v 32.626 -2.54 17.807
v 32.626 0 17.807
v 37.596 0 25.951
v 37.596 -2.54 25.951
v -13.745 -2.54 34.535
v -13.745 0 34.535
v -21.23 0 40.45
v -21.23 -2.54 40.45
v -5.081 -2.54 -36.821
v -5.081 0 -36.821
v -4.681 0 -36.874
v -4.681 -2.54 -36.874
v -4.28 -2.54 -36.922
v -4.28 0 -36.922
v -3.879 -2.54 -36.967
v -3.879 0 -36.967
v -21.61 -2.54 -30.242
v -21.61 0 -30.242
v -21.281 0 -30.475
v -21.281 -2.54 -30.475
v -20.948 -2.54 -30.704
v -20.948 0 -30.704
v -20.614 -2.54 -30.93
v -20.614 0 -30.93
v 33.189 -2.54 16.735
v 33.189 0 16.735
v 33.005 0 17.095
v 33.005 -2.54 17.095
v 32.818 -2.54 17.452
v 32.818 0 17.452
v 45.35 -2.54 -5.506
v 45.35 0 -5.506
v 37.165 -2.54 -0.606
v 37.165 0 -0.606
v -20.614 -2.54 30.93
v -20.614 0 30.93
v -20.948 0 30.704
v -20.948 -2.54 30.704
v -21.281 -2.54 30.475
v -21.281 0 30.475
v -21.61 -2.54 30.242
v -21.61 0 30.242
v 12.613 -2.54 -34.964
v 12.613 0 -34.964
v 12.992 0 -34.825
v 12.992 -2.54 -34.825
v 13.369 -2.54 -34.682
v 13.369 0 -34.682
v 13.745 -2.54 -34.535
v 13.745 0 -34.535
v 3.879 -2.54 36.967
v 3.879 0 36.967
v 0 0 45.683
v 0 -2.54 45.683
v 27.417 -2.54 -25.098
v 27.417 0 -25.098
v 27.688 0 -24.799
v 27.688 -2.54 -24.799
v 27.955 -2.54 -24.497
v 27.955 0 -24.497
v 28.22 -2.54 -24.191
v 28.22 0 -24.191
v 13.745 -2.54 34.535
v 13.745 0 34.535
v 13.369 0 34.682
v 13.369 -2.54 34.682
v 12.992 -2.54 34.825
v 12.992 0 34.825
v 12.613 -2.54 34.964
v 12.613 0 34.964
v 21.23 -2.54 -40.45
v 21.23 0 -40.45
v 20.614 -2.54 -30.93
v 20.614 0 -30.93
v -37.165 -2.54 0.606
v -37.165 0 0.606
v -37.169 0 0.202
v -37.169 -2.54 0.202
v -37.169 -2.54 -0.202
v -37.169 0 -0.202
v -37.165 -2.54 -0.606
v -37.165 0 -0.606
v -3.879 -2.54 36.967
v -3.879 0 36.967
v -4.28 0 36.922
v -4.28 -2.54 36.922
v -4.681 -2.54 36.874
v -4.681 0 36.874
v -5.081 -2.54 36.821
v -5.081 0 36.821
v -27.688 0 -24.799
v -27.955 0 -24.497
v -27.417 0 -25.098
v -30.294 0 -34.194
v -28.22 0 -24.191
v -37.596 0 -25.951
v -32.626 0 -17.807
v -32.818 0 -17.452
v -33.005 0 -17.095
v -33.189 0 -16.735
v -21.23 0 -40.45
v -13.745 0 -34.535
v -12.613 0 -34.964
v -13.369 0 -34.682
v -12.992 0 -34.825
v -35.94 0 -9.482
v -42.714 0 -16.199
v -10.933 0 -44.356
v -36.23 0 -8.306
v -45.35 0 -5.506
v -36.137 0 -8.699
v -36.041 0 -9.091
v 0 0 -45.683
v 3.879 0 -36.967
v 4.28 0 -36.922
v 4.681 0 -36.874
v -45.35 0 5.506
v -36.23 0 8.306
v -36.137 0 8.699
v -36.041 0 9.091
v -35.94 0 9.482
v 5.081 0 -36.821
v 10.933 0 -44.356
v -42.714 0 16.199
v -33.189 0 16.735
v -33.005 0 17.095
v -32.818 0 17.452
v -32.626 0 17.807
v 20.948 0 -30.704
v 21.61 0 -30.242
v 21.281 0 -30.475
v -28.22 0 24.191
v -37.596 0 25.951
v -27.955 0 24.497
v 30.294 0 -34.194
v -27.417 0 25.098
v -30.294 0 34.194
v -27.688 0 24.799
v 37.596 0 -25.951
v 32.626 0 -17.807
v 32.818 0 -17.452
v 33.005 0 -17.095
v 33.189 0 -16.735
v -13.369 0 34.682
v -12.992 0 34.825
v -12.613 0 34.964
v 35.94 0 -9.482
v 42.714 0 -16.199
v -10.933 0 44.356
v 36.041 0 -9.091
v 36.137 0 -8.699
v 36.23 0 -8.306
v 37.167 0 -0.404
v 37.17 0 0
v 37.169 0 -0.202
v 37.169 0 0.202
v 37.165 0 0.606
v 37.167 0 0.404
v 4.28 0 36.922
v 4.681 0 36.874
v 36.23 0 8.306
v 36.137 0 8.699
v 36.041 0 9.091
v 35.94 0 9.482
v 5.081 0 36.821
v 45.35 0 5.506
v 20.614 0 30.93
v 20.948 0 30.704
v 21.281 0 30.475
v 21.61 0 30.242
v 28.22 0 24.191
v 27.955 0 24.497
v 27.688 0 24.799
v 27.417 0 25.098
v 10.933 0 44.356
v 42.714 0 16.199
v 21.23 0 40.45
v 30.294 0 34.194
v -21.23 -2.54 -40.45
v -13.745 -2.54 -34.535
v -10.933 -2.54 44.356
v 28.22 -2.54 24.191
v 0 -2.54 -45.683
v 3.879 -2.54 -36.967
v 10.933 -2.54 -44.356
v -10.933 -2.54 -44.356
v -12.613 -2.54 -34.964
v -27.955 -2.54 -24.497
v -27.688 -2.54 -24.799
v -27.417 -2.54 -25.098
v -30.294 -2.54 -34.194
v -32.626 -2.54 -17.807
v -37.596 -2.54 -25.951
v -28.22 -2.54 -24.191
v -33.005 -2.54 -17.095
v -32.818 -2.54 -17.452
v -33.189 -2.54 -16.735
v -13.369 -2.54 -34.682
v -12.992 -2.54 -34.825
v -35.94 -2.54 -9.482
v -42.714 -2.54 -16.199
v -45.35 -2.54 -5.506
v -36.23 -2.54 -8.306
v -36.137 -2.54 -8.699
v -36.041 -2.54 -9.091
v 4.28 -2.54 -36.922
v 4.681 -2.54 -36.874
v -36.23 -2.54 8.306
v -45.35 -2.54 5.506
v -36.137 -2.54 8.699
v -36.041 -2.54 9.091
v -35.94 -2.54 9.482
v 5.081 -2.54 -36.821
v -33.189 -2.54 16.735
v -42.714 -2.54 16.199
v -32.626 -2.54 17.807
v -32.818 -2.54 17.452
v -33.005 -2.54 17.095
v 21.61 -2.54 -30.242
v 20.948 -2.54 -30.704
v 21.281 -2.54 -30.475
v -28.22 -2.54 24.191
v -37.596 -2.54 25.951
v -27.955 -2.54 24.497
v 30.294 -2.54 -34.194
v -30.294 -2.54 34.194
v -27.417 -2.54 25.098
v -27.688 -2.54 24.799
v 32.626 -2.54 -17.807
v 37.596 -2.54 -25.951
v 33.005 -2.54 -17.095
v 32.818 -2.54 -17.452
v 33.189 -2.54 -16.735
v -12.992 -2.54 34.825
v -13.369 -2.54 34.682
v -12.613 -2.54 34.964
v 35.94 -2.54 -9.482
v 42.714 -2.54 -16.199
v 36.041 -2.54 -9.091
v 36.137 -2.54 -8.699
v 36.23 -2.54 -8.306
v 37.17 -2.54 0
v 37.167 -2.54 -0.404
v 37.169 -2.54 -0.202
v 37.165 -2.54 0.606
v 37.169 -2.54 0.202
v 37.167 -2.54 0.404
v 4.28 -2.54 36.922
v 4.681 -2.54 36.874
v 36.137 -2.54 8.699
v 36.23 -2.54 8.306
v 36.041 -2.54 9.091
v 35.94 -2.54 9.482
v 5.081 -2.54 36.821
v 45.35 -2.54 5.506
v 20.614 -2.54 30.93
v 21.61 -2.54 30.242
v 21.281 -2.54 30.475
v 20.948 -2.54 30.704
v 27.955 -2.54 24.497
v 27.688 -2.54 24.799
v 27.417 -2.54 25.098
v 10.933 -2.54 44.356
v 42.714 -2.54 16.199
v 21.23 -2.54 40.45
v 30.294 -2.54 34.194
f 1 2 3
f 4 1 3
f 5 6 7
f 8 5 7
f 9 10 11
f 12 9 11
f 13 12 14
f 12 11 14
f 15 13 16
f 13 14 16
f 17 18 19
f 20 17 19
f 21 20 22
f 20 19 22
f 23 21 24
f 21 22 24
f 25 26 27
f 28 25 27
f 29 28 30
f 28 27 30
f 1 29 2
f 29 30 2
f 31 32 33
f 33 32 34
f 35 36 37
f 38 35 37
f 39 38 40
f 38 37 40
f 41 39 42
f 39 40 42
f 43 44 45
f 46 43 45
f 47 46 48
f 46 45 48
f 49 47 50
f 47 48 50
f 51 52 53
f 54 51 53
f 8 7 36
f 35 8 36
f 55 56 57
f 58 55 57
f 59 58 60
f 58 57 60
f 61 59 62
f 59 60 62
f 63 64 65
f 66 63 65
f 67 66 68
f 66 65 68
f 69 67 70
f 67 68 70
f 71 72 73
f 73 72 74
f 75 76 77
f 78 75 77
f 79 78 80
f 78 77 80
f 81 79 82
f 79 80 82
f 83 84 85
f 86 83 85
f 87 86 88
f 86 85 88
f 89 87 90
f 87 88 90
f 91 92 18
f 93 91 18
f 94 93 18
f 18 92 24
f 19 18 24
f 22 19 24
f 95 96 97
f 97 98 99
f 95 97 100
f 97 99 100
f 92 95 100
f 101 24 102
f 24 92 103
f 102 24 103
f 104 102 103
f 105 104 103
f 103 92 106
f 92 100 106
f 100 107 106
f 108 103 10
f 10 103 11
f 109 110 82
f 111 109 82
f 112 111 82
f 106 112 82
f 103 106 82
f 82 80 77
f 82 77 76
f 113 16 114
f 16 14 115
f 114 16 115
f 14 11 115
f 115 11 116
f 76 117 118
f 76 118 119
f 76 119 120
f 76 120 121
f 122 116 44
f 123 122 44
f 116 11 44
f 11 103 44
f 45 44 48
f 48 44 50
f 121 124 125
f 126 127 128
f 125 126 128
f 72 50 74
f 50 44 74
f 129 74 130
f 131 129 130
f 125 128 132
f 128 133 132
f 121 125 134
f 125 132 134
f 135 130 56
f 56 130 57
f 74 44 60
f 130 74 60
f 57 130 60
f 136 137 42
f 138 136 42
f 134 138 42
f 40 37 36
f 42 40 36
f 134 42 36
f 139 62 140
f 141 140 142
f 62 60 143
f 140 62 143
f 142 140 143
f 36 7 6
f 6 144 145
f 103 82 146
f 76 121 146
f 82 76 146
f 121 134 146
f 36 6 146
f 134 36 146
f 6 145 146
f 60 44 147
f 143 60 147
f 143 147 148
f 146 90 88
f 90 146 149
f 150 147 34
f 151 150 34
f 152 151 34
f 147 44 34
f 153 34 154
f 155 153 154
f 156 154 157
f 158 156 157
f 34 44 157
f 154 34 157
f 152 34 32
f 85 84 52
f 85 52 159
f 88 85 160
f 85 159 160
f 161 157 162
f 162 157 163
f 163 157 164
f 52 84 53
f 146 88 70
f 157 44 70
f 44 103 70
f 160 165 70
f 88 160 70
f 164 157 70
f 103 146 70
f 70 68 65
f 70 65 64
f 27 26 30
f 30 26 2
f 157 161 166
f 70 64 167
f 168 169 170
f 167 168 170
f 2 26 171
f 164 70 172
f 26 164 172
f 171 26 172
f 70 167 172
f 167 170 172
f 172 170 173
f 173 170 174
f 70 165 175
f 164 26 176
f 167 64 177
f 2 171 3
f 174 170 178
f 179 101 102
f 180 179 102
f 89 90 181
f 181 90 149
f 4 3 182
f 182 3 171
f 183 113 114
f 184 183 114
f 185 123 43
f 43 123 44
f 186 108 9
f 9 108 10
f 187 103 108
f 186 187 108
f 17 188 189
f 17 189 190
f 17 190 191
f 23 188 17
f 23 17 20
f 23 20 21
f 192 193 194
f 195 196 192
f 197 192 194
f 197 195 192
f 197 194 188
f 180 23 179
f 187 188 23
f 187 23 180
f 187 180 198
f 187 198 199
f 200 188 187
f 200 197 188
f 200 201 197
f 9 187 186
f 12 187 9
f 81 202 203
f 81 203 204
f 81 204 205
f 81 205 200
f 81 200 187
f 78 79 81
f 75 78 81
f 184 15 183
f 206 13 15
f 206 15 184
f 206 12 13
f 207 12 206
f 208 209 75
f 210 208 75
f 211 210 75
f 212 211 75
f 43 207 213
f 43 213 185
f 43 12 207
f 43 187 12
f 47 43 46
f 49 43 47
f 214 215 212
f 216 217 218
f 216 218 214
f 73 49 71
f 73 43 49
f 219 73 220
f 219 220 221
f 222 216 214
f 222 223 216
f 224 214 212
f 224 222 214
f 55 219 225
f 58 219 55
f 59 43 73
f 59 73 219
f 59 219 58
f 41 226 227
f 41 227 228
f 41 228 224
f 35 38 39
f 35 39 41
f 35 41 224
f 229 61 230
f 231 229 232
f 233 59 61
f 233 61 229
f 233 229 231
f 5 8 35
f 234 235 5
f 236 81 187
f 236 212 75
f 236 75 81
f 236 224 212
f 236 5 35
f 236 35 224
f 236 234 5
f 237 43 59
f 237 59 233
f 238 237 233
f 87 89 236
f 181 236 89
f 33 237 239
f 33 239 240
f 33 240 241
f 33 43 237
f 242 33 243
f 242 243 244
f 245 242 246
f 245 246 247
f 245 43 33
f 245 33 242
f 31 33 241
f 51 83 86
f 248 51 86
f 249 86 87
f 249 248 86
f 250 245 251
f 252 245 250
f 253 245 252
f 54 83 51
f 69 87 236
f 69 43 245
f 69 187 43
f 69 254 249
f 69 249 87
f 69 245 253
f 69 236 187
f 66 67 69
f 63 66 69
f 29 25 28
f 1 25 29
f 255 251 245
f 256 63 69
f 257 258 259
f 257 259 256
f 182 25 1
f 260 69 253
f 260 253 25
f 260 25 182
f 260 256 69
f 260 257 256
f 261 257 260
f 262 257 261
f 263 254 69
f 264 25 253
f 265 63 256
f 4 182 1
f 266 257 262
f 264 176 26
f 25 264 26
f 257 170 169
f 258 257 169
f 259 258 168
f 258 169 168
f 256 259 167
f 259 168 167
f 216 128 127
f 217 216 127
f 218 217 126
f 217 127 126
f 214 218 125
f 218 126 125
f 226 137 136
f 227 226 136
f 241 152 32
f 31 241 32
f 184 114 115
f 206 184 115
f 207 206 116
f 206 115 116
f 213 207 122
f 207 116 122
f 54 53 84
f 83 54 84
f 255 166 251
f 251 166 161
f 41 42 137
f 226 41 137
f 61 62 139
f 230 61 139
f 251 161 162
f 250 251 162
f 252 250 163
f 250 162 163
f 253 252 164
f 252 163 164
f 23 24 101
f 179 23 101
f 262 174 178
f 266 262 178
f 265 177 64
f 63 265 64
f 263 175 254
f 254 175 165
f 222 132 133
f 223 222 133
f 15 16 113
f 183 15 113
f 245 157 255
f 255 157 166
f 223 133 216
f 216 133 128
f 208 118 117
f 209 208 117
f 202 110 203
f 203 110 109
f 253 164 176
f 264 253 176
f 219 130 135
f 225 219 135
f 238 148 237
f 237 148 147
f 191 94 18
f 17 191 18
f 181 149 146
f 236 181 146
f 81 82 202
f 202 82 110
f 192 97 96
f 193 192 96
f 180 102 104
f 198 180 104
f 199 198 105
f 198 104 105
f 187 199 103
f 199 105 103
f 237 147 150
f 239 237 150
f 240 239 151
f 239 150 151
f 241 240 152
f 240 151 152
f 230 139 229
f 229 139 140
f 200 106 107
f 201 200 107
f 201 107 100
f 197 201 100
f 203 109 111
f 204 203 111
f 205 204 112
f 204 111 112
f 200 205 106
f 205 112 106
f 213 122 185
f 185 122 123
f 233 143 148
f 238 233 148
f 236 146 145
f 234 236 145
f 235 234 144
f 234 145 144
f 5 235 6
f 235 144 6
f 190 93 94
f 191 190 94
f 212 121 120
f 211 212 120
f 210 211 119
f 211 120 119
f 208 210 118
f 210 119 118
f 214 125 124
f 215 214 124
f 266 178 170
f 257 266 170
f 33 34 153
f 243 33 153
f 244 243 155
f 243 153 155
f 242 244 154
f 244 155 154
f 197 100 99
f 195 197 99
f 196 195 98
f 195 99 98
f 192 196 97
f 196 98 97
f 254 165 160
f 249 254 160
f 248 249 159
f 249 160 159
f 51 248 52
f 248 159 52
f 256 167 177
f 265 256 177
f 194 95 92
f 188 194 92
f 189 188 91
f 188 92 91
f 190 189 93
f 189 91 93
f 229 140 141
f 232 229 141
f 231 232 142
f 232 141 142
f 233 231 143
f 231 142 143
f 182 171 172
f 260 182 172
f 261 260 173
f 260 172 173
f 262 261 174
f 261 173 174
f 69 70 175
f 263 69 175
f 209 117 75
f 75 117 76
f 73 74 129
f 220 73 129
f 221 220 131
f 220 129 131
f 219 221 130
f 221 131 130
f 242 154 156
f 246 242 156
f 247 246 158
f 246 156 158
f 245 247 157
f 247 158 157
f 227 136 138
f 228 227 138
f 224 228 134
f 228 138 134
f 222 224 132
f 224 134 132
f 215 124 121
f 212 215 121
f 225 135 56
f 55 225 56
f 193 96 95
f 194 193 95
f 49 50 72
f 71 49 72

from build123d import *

# Parameters (mm, degrees)
F1_DEPTH = 2.54


with BuildPart() as f1:
    # F0 (on Front) → F1 (new body)
    with BuildSketch(Plane.XZ):
        with BuildLine():
            ThreePointArc((37.16459, -0.605521), (37.16829, -0.302771), (37.169523, 0))
            ThreePointArc((37.169523, 0), (37.16829, 0.302771), (37.16459, 0.605521))
            ThreePointArc((37.16459, 0.605521), (36.898515, 4.480291), (36.229566, 8.306143))
            ThreePointArc((36.229566, 8.306143), (36.089444, 8.895249), (35.939744, 9.481994))
            ThreePointArc((35.939744, 9.481994), (34.754108, 13.180495), (33.18901, 16.735084))
            ThreePointArc((33.18901, 16.735084), (32.911978, 17.273539), (32.626211, 17.807409))
            ThreePointArc((32.626211, 17.807409), (30.589918, 21.114696), (28.21963, 24.191443))
            ThreePointArc((28.21963, 24.191443), (27.821787, 24.647953), (27.416561, 25.097921))
            ThreePointArc((27.416561, 25.097921), (24.647953, 27.821787), (21.610228, 30.241883))
            ThreePointArc((21.610228, 30.241883), (21.114696, 30.589918), (20.61356, 30.929833))
            ThreePointArc((20.61356, 30.929833), (17.273539, 32.911978), (13.744917, 34.534775))
            ThreePointArc((13.744917, 34.534775), (13.180495, 34.754108), (12.612573, 34.964216))
            ThreePointArc((12.612573, 34.964216), (8.895249, 36.089444), (5.080802, 36.820631))
            ThreePointArc((5.080802, 36.820631), (4.480291, 36.898515), (3.87859, 36.966606))
            ThreePointArc((3.87859, 36.966606), (0, 37.169523), (-3.87859, 36.966606))
            ThreePointArc((-3.87859, 36.966606), (-4.480291, 36.898515), (-5.080802, 36.820631))
            ThreePointArc((-5.080802, 36.820631), (-8.895249, 36.089444), (-12.612573, 34.964216))
            ThreePointArc((-12.612573, 34.964216), (-13.180495, 34.754108), (-13.744917, 34.534775))
            ThreePointArc((-13.744917, 34.534775), (-17.273539, 32.911978), (-20.61356, 30.929833))
            ThreePointArc((-20.61356, 30.929833), (-21.114696, 30.589918), (-21.610228, 30.241883))
            ThreePointArc((-21.610228, 30.241883), (-24.647953, 27.821787), (-27.416561, 25.097921))
            ThreePointArc((-27.416561, 25.097921), (-27.821787, 24.647953), (-28.21963, 24.191443))
            ThreePointArc((-28.21963, 24.191443), (-30.589918, 21.114696), (-32.626211, 17.807409))
            ThreePointArc((-32.626211, 17.807409), (-32.911978, 17.273539), (-33.18901, 16.735084))
            ThreePointArc((-33.18901, 16.735084), (-34.754108, 13.180495), (-35.939744, 9.481994))
            ThreePointArc((-35.939744, 9.481994), (-36.089444, 8.895249), (-36.229566, 8.306143))
            ThreePointArc((-36.229566, 8.306143), (-36.898515, 4.480291), (-37.16459, 0.605521))
            ThreePointArc((-37.16459, 0.605521), (-37.169523, 0), (-37.16459, -0.605521))
            ThreePointArc((-37.16459, -0.605521), (-36.898515, -4.480291), (-36.229566, -8.306143))
            ThreePointArc((-36.229566, -8.306143), (-36.089444, -8.895249), (-35.939744, -9.481994))
            ThreePointArc((-35.939744, -9.481994), (-34.754108, -13.180495), (-33.18901, -16.735084))
            ThreePointArc((-33.18901, -16.735084), (-32.911978, -17.273539), (-32.626211, -17.807409))
            ThreePointArc((-32.626211, -17.807409), (-30.589918, -21.114696), (-28.21963, -24.191443))
            ThreePointArc((-28.21963, -24.191443), (-27.821787, -24.647953), (-27.416561, -25.097921))
            ThreePointArc((-27.416561, -25.097921), (-24.647953, -27.821787), (-21.610228, -30.241883))
            ThreePointArc((-21.610228, -30.241883), (-21.114696, -30.589918), (-20.61356, -30.929833))
            ThreePointArc((-20.61356, -30.929833), (-17.273539, -32.911978), (-13.744917, -34.534775))
            ThreePointArc((-13.744917, -34.534775), (-13.180495, -34.754108), (-12.612573, -34.964216))
            ThreePointArc((-12.612573, -34.964216), (-8.895249, -36.089444), (-5.080802, -36.820631))
            ThreePointArc((-5.080802, -36.820631), (-4.480291, -36.898515), (-3.87859, -36.966606))
            ThreePointArc((-3.87859, -36.966606), (0, -37.169523), (3.87859, -36.966606))
            ThreePointArc((3.87859, -36.966606), (4.480291, -36.898515), (5.080802, -36.820631))
            ThreePointArc((5.080802, -36.820631), (8.895249, -36.089444), (12.612573, -34.964216))
            ThreePointArc((12.612573, -34.964216), (13.180495, -34.754108), (13.744917, -34.534775))
            ThreePointArc((13.744917, -34.534775), (17.273539, -32.911978), (20.61356, -30.929833))
            ThreePointArc((20.61356, -30.929833), (21.114696, -30.589918), (21.610228, -30.241883))
            ThreePointArc((21.610228, -30.241883), (24.647953, -27.821787), (27.416561, -25.097921))
            ThreePointArc((27.416561, -25.097921), (27.821787, -24.647953), (28.21963, -24.191443))
            ThreePointArc((28.21963, -24.191443), (30.589918, -21.114696), (32.626211, -17.807409))
            ThreePointArc((32.626211, -17.807409), (32.911978, -17.273539), (33.18901, -16.735084))
            ThreePointArc((33.18901, -16.735084), (34.754108, -13.180495), (35.939744, -9.481994))
            ThreePointArc((35.939744, -9.481994), (36.089444, -8.895249), (36.229566, -8.306143))
            ThreePointArc((36.229566, -8.306143), (36.898515, -4.480291), (37.16459, -0.605521))
        make_face()
        with BuildLine():
            ThreePointArc((36.229566, 8.306143), (36.898515, 4.480291), (37.16459, 0.605521))
            Line((37.16459, 0.605521), (45.350049, 5.506493))
            Line((45.350049, 5.506493), (36.229566, 8.306143))
        make_face()
        with BuildLine():
            Line((45.350049, -5.506493), (37.16459, -0.605521))
            ThreePointArc((37.16459, -0.605521), (36.898515, -4.480291), (36.229566, -8.306143))
            Line((36.229566, -8.306143), (45.350049, -5.506493))
        make_face()
        with BuildLine():
            ThreePointArc((33.18901, 16.735084), (34.754108, 13.180495), (35.939744, 9.481994))
            Line((35.939744, 9.481994), (42.714469, 16.199461))
            Line((42.714469, 16.199461), (33.18901, 16.735084))
        make_face()
        with BuildLine():
            Line((42.714469, -16.199461), (35.939744, -9.481994))
            ThreePointArc((35.939744, -9.481994), (34.754108, -13.180495), (33.18901, -16.735084))
            Line((33.18901, -16.735084), (42.714469, -16.199461))
        make_face()
        with BuildLine():
            ThreePointArc((28.21963, 24.191443), (30.589918, 21.114696), (32.626211, 17.807409))
            Line((32.626211, 17.807409), (37.596479, 25.950976))
            Line((37.596479, 25.950976), (28.21963, 24.191443))
        make_face()
        with BuildLine():
            Line((37.596479, -25.950976), (32.626211, -17.807409))
            ThreePointArc((32.626211, -17.807409), (30.589918, -21.114696), (28.21963, -24.191443))
            Line((28.21963, -24.191443), (37.596479, -25.950976))
        make_face()
        with BuildLine():
            ThreePointArc((21.610228, 30.241883), (24.647953, 27.821787), (27.416561, 25.097921))
            Line((27.416561, 25.097921), (30.293519, 34.194314))
            Line((30.293519, 34.194314), (21.610228, 30.241883))
        make_face()
        with BuildLine():
            Line((30.293519, -34.194314), (27.416561, -25.097921))
            ThreePointArc((27.416561, -25.097921), (24.647953, -27.821787), (21.610228, -30.241883))
            Line((21.610228, -30.241883), (30.293519, -34.194314))
        make_face()
        with BuildLine():
            ThreePointArc((13.744917, 34.534775), (17.273539, 32.911978), (20.61356, 30.929833))
            Line((20.61356, 30.929833), (21.230009, 40.450403))
            Line((21.230009, 40.450403), (13.744917, 34.534775))
        make_face()
        with BuildLine():
            Line((21.230009, -40.450403), (20.61356, -30.929833))
            ThreePointArc((20.61356, -30.929833), (17.273539, -32.911978), (13.744917, -34.534775))
            Line((13.744917, -34.534775), (21.230009, -40.450403))
        make_face()
        with BuildLine():
            ThreePointArc((5.080802, 36.820631), (8.895249, 36.089444), (12.612573, 34.964216))
            Line((12.612573, 34.964216), (10.932689, 44.355662))
            Line((10.932689, 44.355662), (5.080802, 36.820631))
        make_face()
        with BuildLine():
            Line((10.932689, -44.355662), (12.612573, -34.964216))
            ThreePointArc((12.612573, -34.964216), (8.895249, -36.089444), (5.080802, -36.820631))
            Line((5.080802, -36.820631), (10.932689, -44.355662))
        make_face()
        with BuildLine():
            ThreePointArc((-3.87859, 36.966606), (0, 37.169523), (3.87859, 36.966606))
            Line((3.87859, 36.966606), (0, 45.683131))
            Line((0, 45.683131), (-3.87859, 36.966606))
        make_face()
        with BuildLine():
            Line((0, -45.683131), (3.87859, -36.966606))
            ThreePointArc((3.87859, -36.966606), (0, -37.169523), (-3.87859, -36.966606))
            Line((-3.87859, -36.966606), (0, -45.683131))
        make_face()
        with BuildLine():
            ThreePointArc((-12.612573, 34.964216), (-8.895249, 36.089444), (-5.080802, 36.820631))
            Line((-5.080802, 36.820631), (-10.932689, 44.355662))
            Line((-10.932689, 44.355662), (-12.612573, 34.964216))
        make_face()
        with BuildLine():
            Line((-10.932689, -44.355662), (-5.080802, -36.820631))
            ThreePointArc((-5.080802, -36.820631), (-8.895249, -36.089444), (-12.612573, -34.964216))
            Line((-12.612573, -34.964216), (-10.932689, -44.355662))
        make_face()
        with BuildLine():
            ThreePointArc((-20.61356, 30.929833), (-17.273539, 32.911978), (-13.744917, 34.534775))
            Line((-13.744917, 34.534775), (-21.230009, 40.450403))
            Line((-21.230009, 40.450403), (-20.61356, 30.929833))
        make_face()
        with BuildLine():
            Line((-21.230009, -40.450403), (-13.744917, -34.534775))
            ThreePointArc((-13.744917, -34.534775), (-17.273539, -32.911978), (-20.61356, -30.929833))
            Line((-20.61356, -30.929833), (-21.230009, -40.450403))
        make_face()
        with BuildLine():
            ThreePointArc((-27.416561, 25.097921), (-24.647953, 27.821787), (-21.610228, 30.241883))
            Line((-21.610228, 30.241883), (-30.293519, 34.194314))
            Line((-30.293519, 34.194314), (-27.416561, 25.097921))
        make_face()
        with BuildLine():
            Line((-30.293519, -34.194314), (-21.610228, -30.241883))
            ThreePointArc((-21.610228, -30.241883), (-24.647953, -27.821787), (-27.416561, -25.097921))
            Line((-27.416561, -25.097921), (-30.293519, -34.194314))
        make_face()
        with BuildLine():
            ThreePointArc((-32.626211, 17.807409), (-30.589918, 21.114696), (-28.21963, 24.191443))
            Line((-28.21963, 24.191443), (-37.596479, 25.950976))
            Line((-37.596479, 25.950976), (-32.626211, 17.807409))
        make_face()
        with BuildLine():
            Line((-37.596479, -25.950976), (-28.21963, -24.191443))
            ThreePointArc((-28.21963, -24.191443), (-30.589918, -21.114696), (-32.626211, -17.807409))
            Line((-32.626211, -17.807409), (-37.596479, -25.950976))
        make_face()
        with BuildLine():
            ThreePointArc((-35.939744, 9.481994), (-34.754108, 13.180495), (-33.18901, 16.735084))
            Line((-33.18901, 16.735084), (-42.714469, 16.199461))
            Line((-42.714469, 16.199461), (-35.939744, 9.481994))
        make_face()
        with BuildLine():
            Line((-42.714469, -16.199461), (-33.18901, -16.735084))
            ThreePointArc((-33.18901, -16.735084), (-34.754108, -13.180495), (-35.939744, -9.481994))
            Line((-35.939744, -9.481994), (-42.714469, -16.199461))
        make_face()
        with BuildLine():
            ThreePointArc((-37.16459, 0.605521), (-36.898515, 4.480291), (-36.229566, 8.306143))
            Line((-36.229566, 8.306143), (-45.350049, 5.506493))
            Line((-45.350049, 5.506493), (-37.16459, 0.605521))
        make_face()
        with BuildLine():
            Line((-45.350049, -5.506493), (-36.229566, -8.306143))
            ThreePointArc((-36.229566, -8.306143), (-36.898515, -4.480291), (-37.16459, -0.605521))
            Line((-37.16459, -0.605521), (-45.350049, -5.506493))
        make_face()
    extrude(amount=F1_DEPTH)


solid = f1.part
